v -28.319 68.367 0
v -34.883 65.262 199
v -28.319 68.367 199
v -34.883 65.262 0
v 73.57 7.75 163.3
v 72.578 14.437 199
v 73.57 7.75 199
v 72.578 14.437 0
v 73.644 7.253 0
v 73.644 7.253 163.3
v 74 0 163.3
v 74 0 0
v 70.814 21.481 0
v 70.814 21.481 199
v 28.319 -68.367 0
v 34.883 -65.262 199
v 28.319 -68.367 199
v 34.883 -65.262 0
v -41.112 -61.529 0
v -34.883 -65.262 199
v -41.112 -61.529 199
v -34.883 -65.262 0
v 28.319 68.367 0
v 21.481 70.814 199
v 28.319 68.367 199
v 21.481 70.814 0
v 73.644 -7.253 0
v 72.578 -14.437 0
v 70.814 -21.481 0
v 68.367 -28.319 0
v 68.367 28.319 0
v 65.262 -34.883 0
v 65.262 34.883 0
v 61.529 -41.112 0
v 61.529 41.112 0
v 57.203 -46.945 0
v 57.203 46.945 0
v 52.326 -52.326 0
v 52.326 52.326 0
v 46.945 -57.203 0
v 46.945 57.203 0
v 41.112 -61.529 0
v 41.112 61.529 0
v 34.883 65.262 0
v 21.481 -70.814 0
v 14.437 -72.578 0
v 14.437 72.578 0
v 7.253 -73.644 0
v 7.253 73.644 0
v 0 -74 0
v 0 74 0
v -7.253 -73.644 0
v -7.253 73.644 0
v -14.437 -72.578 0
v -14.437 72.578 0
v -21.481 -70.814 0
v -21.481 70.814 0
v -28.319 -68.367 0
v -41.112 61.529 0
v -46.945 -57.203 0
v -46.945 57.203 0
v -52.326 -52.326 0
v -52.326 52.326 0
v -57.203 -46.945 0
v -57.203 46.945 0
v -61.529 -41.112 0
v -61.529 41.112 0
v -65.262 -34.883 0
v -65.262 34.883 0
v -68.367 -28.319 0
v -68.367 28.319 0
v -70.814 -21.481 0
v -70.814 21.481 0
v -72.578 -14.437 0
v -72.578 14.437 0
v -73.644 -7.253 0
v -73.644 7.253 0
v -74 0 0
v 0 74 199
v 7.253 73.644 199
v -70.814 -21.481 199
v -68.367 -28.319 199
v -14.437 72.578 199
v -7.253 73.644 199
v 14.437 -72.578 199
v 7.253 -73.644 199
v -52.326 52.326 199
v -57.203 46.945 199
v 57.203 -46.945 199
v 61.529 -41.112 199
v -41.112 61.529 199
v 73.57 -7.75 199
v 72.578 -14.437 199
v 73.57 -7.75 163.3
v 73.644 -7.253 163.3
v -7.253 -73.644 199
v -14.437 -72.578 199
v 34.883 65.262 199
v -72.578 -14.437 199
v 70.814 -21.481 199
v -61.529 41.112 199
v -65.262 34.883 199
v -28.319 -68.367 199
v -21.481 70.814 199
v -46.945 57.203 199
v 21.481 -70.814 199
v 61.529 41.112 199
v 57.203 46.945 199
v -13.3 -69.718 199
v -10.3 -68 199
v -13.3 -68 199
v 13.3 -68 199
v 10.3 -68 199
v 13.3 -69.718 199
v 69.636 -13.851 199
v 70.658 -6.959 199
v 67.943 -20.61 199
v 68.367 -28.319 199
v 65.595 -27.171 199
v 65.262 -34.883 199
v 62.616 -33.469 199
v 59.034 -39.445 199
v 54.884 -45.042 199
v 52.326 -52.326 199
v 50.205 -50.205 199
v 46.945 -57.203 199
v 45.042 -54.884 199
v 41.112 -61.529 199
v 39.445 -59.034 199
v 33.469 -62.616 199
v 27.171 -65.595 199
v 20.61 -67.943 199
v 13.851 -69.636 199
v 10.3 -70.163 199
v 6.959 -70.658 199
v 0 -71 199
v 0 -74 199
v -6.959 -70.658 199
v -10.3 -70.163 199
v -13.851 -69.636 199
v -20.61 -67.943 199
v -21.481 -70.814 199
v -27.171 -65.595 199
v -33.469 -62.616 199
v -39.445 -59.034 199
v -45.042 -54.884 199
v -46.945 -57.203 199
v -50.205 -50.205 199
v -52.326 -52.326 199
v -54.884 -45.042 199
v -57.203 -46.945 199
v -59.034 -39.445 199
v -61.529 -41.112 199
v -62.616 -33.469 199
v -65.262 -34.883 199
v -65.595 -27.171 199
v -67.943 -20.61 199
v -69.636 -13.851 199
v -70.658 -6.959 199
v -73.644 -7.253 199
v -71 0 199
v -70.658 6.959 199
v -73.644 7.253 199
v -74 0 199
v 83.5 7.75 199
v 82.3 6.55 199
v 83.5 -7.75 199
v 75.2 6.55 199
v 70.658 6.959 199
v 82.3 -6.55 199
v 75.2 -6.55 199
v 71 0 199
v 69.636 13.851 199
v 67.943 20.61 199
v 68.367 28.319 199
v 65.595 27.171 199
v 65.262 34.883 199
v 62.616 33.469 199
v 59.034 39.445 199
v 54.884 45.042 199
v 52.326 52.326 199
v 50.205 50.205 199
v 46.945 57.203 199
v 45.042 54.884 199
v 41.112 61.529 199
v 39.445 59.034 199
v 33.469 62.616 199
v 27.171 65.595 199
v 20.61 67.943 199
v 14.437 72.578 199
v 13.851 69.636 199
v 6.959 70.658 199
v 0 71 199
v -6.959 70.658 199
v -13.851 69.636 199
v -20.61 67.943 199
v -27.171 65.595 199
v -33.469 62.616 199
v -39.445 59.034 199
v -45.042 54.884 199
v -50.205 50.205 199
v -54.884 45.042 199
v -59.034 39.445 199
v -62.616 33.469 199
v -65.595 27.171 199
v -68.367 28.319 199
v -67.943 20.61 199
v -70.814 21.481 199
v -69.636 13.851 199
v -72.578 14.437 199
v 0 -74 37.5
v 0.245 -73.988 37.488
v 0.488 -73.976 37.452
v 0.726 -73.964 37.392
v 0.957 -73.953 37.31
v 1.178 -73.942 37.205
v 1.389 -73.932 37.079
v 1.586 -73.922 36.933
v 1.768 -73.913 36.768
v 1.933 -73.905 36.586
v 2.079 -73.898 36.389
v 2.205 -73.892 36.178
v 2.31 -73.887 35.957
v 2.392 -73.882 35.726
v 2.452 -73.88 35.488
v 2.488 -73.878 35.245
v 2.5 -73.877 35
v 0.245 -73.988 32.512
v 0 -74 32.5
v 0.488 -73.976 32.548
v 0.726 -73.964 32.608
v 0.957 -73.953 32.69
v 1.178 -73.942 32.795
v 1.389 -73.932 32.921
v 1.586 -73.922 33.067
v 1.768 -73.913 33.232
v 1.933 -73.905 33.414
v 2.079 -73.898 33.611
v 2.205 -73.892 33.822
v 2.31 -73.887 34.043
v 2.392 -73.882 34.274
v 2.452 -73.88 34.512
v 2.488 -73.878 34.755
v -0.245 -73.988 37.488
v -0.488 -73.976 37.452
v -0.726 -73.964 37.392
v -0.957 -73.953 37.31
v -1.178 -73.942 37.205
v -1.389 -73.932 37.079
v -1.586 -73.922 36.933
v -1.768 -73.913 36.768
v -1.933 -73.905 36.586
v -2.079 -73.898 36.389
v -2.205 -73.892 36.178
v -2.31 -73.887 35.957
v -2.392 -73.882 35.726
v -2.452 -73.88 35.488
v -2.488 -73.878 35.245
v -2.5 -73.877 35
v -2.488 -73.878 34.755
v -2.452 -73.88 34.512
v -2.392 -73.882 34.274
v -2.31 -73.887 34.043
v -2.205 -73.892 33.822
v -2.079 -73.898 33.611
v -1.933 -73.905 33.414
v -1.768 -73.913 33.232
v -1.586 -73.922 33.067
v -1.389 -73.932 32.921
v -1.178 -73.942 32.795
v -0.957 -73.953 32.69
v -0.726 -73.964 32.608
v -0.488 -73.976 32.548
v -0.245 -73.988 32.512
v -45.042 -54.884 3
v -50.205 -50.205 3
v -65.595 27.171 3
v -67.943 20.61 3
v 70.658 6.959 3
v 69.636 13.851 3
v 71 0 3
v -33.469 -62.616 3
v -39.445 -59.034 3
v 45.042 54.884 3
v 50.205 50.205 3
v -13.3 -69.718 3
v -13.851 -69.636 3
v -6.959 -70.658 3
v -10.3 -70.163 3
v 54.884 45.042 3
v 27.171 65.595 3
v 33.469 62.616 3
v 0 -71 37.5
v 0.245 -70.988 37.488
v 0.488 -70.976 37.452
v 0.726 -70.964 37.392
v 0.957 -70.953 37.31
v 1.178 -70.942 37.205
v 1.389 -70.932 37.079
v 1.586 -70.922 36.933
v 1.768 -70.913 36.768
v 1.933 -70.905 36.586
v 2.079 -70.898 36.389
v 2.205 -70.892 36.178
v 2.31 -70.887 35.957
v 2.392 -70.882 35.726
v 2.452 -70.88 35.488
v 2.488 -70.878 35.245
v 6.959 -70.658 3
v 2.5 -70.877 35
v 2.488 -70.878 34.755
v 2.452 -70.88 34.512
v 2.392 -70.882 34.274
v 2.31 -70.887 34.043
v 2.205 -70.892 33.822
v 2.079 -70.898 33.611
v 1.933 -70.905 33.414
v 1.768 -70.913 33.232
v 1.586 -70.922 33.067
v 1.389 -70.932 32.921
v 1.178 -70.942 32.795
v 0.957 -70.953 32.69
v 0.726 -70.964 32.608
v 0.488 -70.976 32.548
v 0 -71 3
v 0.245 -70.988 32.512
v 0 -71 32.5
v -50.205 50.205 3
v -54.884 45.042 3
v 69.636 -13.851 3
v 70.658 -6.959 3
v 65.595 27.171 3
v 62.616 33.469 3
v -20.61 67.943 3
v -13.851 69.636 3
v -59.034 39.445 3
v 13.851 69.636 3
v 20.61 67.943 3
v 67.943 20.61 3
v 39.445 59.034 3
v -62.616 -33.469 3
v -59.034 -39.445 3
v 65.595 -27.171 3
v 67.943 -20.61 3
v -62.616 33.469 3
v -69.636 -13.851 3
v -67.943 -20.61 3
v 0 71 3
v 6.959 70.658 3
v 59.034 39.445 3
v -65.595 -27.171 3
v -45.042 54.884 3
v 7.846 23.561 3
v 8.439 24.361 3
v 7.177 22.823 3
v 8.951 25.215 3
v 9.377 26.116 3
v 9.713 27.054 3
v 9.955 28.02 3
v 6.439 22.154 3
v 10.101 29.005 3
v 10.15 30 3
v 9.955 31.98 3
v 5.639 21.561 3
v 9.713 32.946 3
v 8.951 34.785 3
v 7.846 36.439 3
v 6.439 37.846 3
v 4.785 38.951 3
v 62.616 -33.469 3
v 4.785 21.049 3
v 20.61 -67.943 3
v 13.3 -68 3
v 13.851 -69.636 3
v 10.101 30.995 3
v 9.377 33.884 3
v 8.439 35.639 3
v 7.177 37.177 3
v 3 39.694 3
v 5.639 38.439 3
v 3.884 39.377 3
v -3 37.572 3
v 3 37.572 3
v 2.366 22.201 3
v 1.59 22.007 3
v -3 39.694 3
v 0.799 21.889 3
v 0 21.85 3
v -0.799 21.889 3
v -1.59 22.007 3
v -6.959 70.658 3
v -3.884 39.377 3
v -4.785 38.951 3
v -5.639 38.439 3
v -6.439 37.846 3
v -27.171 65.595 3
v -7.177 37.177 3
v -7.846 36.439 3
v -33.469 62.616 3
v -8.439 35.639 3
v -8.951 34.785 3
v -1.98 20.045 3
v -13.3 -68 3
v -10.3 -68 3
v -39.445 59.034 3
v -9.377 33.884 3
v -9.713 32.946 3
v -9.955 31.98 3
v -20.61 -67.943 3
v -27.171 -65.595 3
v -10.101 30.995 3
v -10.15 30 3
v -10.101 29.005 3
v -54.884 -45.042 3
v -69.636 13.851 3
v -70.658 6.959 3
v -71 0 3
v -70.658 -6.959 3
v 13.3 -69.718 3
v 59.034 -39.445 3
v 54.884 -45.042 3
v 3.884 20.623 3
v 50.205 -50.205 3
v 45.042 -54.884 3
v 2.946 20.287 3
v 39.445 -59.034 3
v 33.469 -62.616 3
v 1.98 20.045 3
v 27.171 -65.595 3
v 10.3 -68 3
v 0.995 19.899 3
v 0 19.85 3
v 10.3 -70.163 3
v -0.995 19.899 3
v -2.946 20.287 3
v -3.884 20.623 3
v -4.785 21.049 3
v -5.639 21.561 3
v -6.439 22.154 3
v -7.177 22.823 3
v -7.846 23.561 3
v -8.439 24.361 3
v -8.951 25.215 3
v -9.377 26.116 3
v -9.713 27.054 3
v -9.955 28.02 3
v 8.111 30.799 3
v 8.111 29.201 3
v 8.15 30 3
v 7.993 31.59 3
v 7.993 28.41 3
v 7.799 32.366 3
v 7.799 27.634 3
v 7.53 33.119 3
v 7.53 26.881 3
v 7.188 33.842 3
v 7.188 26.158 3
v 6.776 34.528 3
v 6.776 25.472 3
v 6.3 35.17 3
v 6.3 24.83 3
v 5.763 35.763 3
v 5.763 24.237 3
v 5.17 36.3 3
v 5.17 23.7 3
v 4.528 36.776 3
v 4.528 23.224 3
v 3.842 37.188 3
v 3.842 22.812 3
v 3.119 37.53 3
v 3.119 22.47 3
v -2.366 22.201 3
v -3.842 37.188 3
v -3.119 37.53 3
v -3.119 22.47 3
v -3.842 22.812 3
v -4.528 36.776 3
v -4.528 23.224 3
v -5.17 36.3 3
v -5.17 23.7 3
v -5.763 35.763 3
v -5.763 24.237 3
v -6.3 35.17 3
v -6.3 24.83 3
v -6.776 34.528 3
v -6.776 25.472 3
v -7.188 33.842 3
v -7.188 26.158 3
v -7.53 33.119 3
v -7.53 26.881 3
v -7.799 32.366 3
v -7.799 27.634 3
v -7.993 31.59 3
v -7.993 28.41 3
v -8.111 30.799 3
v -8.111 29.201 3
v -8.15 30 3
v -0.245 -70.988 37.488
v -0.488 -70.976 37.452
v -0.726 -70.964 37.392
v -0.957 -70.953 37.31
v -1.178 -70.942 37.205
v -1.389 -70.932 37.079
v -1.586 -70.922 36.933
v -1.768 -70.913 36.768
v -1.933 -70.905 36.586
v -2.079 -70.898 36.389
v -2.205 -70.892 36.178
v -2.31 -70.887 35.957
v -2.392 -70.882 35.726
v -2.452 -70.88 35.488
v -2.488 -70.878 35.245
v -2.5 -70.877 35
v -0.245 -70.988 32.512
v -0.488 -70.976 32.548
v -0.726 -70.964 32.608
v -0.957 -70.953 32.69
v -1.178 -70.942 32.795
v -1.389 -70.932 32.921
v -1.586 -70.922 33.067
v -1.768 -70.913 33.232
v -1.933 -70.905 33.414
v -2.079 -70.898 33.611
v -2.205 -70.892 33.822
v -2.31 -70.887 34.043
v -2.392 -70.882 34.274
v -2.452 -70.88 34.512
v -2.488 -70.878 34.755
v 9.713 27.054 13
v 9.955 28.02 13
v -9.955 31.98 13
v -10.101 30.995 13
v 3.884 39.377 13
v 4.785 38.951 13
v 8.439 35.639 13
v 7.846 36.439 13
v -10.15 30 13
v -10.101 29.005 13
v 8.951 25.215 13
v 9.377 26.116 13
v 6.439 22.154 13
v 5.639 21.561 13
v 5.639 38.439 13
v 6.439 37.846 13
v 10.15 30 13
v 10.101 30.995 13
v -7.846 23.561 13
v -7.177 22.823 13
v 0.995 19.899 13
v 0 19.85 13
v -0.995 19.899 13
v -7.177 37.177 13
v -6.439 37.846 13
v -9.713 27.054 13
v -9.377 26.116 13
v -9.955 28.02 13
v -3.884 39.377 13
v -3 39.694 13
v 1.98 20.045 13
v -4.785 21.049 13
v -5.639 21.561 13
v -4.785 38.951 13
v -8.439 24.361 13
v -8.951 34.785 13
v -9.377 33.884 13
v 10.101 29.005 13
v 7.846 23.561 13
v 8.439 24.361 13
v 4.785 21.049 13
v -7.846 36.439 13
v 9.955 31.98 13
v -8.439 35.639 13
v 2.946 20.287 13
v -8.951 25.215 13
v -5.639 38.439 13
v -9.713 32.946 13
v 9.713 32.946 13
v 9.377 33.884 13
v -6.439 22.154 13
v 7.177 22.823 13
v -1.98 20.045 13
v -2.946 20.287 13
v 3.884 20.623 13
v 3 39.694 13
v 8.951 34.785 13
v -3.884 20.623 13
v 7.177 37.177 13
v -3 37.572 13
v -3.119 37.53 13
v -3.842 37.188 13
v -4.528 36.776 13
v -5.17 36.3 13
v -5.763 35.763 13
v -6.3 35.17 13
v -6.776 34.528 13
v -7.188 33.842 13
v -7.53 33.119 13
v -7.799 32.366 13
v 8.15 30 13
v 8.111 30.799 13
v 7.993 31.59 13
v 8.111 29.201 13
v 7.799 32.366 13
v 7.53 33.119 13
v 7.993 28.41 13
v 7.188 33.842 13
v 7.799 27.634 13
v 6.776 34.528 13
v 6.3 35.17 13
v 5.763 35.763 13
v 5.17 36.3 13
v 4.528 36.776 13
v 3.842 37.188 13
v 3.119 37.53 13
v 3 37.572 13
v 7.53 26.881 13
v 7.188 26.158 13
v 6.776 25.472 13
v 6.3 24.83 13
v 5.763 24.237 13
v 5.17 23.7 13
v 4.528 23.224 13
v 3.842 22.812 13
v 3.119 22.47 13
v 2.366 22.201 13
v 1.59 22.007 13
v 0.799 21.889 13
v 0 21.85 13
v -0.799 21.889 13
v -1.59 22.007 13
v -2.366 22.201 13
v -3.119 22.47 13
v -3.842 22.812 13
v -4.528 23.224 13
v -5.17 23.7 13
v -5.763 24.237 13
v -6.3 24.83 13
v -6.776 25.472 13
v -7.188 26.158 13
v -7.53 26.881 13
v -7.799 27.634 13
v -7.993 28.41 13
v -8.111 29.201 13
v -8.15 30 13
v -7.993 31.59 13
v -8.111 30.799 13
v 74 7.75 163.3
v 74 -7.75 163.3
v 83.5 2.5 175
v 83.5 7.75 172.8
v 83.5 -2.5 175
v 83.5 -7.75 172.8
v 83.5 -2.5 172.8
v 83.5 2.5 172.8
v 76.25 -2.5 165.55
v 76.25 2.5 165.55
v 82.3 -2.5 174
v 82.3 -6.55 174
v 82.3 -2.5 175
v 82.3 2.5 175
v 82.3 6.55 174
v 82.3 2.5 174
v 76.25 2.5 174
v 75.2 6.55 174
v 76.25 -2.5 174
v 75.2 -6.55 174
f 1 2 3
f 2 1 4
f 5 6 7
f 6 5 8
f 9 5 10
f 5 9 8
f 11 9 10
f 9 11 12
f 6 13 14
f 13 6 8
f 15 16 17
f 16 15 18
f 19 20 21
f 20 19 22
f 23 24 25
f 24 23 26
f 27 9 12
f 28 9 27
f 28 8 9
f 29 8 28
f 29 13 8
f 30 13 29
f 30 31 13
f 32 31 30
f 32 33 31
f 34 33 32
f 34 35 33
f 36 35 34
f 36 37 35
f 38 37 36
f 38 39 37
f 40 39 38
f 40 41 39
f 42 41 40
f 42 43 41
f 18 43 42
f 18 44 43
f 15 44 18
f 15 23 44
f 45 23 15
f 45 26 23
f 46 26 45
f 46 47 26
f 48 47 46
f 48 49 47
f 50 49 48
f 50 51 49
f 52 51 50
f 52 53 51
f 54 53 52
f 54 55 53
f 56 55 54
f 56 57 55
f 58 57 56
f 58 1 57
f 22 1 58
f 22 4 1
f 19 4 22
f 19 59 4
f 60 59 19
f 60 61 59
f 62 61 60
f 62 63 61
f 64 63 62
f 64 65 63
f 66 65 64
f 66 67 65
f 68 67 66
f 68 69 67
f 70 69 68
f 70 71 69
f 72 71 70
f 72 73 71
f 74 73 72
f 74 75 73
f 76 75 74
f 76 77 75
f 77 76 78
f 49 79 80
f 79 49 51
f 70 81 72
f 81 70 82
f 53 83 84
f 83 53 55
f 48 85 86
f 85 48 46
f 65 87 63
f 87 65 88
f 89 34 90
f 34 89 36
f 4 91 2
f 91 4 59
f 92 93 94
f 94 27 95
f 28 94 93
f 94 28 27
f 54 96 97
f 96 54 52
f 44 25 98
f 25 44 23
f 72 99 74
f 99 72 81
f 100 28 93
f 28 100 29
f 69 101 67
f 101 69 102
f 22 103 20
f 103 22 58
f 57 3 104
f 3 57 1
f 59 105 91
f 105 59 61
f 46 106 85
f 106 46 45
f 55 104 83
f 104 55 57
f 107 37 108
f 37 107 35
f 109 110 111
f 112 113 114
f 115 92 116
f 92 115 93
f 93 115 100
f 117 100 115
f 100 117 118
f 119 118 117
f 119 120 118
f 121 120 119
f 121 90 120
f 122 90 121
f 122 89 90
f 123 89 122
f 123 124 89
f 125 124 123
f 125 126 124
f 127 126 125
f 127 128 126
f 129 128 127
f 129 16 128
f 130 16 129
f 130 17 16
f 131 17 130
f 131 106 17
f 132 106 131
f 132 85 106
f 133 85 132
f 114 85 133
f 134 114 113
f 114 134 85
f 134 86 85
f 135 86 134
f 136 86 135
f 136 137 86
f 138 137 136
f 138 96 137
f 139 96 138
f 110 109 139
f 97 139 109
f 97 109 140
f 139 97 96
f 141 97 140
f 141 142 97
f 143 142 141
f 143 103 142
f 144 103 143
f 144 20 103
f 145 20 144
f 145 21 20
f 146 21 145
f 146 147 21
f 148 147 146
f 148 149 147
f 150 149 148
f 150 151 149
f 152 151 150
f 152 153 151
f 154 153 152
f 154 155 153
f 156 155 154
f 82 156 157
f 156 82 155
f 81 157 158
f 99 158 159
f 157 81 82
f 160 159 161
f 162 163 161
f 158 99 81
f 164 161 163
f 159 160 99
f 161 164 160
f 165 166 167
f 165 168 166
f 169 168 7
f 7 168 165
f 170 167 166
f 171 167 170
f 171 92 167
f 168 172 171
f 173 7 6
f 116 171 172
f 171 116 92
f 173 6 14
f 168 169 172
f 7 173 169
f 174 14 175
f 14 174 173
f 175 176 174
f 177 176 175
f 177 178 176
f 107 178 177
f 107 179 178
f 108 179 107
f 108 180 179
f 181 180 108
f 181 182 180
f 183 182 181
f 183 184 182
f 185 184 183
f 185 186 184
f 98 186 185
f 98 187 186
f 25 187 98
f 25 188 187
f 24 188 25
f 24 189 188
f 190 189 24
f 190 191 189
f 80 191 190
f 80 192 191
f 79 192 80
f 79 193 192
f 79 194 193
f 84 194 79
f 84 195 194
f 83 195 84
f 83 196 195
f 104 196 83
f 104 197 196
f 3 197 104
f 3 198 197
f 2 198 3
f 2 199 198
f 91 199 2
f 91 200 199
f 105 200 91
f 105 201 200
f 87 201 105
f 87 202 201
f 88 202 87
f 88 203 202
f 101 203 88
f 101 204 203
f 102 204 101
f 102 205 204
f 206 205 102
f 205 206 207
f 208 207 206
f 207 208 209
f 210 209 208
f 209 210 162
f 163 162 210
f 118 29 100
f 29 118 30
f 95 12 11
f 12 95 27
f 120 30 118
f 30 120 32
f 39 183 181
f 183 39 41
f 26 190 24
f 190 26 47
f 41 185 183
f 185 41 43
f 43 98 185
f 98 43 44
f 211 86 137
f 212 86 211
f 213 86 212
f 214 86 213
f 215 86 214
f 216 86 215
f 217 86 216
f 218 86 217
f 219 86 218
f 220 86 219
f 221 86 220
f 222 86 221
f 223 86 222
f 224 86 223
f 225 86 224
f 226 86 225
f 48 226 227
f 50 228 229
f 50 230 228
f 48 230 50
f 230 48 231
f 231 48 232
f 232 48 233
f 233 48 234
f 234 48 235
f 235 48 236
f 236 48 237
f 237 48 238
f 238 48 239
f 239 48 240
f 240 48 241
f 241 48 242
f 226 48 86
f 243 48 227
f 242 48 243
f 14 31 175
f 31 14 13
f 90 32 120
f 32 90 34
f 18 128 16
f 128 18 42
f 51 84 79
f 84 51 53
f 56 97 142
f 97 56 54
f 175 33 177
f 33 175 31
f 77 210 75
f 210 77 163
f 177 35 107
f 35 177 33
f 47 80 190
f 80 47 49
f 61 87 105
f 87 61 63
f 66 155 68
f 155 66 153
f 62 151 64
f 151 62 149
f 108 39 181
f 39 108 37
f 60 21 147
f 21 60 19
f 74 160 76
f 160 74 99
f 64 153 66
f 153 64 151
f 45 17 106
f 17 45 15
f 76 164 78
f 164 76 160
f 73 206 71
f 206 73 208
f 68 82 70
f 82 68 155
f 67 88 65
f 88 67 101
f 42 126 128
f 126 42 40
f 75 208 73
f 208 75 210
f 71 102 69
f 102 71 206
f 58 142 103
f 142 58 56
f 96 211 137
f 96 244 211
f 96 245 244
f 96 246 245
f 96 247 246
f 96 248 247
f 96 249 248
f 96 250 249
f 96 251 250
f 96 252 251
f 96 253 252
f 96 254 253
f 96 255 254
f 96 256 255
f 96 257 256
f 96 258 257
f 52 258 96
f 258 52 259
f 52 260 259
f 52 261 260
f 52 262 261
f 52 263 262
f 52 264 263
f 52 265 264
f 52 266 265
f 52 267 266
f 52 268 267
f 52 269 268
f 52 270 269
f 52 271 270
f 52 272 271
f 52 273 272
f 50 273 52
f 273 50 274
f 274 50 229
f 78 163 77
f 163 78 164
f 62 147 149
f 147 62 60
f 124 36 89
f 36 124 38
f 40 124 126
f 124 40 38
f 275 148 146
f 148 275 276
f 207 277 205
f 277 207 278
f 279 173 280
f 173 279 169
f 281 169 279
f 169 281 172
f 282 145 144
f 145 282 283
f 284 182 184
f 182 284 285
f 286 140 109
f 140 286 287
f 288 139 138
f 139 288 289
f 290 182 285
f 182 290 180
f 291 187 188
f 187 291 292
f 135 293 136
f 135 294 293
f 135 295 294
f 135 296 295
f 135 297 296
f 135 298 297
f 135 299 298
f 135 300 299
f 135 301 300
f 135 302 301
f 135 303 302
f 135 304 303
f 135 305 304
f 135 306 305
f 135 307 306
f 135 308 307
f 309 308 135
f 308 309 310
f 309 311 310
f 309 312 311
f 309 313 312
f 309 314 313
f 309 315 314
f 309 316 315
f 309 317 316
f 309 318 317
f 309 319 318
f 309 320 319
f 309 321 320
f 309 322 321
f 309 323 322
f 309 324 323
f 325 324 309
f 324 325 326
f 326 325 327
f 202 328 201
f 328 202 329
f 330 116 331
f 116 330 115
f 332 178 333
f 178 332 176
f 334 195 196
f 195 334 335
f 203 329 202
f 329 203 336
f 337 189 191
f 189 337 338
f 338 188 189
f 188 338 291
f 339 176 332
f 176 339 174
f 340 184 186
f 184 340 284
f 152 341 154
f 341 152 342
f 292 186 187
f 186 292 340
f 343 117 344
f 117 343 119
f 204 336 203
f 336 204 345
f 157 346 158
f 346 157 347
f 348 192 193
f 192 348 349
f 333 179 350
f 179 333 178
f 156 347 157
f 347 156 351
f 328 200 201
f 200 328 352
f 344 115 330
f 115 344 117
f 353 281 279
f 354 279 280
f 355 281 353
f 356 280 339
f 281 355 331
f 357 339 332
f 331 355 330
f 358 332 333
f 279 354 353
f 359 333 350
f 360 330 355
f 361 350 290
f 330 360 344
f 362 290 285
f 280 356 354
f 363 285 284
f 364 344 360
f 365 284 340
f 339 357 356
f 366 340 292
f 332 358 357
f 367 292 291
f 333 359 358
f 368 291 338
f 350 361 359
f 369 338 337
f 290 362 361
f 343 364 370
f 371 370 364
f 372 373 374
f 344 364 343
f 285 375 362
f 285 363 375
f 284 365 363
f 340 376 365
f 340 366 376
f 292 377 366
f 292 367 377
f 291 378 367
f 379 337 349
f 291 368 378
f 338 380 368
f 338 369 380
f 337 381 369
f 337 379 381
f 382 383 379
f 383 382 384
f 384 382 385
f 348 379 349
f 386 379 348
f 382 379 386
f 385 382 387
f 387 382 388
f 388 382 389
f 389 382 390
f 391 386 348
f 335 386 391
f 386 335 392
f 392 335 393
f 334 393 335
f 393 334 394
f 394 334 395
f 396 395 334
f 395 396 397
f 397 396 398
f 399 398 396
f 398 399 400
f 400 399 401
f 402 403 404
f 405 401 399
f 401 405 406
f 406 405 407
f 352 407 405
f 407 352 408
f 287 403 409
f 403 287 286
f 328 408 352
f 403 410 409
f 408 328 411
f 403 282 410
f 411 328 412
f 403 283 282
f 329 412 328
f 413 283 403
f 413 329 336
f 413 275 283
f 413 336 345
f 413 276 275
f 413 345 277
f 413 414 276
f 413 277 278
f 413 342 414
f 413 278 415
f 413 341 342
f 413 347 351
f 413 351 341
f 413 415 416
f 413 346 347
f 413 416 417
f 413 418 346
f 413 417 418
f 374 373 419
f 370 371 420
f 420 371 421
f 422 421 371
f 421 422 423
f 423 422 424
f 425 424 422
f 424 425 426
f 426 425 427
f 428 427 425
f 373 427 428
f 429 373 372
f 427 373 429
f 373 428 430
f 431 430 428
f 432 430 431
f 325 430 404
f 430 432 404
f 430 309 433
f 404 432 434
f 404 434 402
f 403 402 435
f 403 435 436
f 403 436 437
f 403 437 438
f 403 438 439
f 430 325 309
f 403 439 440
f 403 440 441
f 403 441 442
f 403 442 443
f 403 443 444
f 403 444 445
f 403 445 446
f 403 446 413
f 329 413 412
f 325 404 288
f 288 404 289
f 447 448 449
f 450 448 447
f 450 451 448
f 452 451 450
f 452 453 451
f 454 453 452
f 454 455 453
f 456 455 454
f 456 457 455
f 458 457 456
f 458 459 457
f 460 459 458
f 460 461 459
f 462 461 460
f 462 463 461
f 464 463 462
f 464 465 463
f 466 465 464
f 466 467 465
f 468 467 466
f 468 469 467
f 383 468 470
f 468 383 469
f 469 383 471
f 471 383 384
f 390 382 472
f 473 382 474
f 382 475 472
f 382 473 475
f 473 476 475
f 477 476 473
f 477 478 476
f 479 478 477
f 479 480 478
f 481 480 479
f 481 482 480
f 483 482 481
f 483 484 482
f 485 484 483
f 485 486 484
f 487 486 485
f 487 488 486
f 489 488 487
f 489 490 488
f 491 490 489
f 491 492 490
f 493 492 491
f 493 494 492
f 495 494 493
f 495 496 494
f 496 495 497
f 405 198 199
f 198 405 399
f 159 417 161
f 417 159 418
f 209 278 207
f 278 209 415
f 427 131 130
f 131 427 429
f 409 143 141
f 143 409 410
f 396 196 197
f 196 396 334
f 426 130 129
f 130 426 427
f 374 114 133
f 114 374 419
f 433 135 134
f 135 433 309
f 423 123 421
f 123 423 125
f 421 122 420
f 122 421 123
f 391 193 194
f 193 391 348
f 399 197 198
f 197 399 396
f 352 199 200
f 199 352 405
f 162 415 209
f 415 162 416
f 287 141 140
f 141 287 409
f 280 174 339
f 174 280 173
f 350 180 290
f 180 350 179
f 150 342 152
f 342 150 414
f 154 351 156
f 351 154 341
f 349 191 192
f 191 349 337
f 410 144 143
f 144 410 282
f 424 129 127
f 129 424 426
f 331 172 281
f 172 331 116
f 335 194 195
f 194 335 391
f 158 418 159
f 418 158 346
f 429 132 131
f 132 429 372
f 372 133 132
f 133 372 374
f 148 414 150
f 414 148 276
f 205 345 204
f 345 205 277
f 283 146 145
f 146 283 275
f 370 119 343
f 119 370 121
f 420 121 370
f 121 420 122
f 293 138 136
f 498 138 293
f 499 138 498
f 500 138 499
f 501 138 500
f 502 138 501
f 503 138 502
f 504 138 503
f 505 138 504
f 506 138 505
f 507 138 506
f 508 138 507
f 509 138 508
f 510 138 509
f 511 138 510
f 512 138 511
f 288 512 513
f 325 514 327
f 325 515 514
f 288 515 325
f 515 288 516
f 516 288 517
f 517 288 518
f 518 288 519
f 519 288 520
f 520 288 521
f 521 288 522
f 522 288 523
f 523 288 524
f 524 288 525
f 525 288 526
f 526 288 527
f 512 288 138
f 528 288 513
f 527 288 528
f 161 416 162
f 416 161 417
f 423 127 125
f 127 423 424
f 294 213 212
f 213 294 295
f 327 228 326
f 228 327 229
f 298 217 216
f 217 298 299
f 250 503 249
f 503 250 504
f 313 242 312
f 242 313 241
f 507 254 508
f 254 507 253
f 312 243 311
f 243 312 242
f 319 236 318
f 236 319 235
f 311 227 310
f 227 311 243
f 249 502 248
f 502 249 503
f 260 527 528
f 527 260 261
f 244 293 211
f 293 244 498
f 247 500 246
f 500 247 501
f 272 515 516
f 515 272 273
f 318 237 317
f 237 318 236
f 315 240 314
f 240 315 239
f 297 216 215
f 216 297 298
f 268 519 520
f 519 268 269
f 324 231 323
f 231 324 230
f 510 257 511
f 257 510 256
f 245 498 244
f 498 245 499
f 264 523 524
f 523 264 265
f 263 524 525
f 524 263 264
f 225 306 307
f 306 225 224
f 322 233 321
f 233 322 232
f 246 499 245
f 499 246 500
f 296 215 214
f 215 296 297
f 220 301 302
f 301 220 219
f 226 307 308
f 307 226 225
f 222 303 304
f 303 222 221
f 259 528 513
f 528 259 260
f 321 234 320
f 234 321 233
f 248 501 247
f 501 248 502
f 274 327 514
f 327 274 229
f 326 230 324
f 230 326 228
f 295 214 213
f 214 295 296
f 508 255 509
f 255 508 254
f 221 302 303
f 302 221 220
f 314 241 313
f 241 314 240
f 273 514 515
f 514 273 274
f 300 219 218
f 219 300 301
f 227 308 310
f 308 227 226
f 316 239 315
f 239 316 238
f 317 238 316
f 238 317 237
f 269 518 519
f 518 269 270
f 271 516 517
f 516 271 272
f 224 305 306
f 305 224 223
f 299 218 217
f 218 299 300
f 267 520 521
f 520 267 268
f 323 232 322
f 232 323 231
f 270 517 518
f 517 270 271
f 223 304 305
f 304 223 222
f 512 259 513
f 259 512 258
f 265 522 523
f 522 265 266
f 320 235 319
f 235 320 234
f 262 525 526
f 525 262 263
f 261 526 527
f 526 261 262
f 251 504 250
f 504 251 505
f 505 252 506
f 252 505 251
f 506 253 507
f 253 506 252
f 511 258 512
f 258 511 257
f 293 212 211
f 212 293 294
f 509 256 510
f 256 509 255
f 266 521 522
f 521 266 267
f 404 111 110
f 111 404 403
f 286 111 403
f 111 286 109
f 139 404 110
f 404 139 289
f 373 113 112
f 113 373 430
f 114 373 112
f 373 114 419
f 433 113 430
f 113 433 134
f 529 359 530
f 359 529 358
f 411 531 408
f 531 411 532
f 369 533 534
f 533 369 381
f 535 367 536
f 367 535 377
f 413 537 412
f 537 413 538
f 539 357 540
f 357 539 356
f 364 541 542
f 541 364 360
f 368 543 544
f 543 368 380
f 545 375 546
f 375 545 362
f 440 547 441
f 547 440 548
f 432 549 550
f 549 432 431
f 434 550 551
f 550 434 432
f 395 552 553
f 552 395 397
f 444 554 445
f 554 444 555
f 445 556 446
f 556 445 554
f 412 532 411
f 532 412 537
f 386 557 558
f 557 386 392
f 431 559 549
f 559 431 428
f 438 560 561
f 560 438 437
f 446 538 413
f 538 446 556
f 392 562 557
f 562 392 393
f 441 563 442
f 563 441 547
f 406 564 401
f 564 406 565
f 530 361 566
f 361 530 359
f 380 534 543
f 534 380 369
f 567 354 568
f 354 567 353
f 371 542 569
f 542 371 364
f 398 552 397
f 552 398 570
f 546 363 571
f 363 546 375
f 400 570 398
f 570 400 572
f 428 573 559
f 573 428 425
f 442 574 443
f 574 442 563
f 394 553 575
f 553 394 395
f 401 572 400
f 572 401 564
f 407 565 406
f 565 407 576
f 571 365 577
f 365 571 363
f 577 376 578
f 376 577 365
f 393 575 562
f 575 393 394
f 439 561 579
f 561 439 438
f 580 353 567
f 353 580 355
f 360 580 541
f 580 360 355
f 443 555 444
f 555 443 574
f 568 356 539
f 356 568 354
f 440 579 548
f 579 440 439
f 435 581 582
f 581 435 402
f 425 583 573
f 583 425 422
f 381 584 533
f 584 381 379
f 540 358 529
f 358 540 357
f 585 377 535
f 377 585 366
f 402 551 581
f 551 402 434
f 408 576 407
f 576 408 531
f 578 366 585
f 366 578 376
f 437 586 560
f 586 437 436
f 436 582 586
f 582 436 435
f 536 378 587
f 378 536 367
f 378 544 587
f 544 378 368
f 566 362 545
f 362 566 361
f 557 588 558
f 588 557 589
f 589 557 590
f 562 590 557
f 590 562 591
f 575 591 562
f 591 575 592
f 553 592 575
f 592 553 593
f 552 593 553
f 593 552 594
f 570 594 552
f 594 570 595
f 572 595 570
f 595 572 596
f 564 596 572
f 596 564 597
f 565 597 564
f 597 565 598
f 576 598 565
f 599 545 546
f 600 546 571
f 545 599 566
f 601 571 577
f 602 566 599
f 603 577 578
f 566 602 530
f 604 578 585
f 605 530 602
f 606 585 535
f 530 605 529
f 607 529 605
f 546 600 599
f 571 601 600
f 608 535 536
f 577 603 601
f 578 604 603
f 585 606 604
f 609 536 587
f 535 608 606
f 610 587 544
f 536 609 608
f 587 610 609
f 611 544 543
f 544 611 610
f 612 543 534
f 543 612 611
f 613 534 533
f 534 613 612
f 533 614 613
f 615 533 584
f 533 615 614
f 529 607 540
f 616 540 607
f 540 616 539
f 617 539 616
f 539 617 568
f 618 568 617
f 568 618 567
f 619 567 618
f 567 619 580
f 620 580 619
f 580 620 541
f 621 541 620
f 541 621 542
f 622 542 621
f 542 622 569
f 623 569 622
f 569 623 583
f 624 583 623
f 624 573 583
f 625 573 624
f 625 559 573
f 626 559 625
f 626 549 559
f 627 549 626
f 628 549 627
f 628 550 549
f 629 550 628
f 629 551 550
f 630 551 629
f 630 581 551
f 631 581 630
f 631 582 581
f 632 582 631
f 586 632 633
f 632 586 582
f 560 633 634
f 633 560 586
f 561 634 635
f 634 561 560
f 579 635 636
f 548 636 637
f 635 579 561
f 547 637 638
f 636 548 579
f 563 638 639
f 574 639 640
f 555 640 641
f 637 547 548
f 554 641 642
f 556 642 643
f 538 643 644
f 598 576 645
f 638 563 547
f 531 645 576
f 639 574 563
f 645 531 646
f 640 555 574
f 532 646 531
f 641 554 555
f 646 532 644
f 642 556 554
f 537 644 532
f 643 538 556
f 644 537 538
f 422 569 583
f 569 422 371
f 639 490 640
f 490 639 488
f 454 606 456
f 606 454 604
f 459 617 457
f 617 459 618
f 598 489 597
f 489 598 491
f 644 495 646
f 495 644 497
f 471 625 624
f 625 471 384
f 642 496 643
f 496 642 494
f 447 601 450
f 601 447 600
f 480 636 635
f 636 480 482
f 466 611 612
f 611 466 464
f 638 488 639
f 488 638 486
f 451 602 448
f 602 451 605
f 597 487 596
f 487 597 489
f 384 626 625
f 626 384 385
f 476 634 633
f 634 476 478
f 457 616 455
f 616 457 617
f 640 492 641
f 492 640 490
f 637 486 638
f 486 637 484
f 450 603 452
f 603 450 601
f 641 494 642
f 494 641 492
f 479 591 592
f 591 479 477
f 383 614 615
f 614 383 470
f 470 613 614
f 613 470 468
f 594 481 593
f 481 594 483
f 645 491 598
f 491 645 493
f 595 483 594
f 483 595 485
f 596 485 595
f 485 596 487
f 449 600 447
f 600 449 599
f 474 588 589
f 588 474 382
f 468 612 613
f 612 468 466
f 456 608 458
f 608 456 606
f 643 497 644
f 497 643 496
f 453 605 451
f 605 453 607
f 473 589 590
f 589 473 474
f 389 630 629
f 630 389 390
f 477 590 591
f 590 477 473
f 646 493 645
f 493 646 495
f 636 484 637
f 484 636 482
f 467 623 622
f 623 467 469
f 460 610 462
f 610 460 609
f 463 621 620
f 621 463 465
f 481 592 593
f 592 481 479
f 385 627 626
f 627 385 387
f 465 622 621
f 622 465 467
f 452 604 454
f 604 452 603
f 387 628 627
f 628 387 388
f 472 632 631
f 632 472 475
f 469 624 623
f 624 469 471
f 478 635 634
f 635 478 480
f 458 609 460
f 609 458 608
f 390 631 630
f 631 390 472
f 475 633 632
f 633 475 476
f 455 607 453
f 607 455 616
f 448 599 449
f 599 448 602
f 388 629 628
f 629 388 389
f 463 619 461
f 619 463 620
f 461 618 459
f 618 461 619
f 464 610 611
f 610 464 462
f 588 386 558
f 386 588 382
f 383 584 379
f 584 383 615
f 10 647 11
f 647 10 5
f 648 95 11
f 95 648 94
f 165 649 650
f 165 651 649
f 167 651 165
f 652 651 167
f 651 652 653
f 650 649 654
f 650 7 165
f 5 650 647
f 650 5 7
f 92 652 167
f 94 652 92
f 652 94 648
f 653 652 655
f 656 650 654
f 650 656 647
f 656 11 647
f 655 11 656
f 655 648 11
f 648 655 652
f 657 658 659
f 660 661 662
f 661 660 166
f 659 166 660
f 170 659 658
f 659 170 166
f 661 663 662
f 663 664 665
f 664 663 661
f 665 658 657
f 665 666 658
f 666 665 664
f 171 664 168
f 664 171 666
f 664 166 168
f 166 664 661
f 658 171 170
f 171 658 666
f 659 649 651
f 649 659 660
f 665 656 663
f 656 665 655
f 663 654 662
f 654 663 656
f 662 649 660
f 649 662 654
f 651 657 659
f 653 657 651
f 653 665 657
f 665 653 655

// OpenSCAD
// =============================================================================
// Reservoir — Vand-beholder som plant cup hænger nedsænket i (Variant A)
// =============================================================================
// ZERO-PENETRATION (ADR 009): reservoiret har INGEN gennemføringer under
// vandlinjen — bunden og væggen under overflow-niveau er 100% tætte.
// Eneste hul er OVERFLOW-hullet (over max-fill, det er selve pointen).
// Slanger og kabler ruter gennem ring-gabet og cup-flangens åbninger.
//
// Features (vinkler jf. params.scad allokering / ADR 010 scalloped cup):
//   90°: float switch klips-ring i bunden (kabel op ad cup'ens kabel-kanal)
//    0°: lomme UDEN PÅ væggen til USB-C-forlængerens hun-ende (ADR 013) —
//        stikket flugter med rimmen, flangen har et hak ovenover
//  270°: to lodrette guide-ribber til water level strip — de stikker ind i
//        cup'ens brede REFILL-KANAL og fungerer samtidig som rotations-lås
//        (ribbe-spændet passer kun i den kanal) — plus overflow-hul i
//        væggen, 8mm under cup-bund-niveau
//
// STACK VARIANT A: høj cylinder hvor cuppen hænger fra top-rimmen via sin
// flange. Vandet lever i zonen UNDER cup-bunden. Højde og kapacitet
// beregnes i params.scad (M-cup: ~199mm, ~815 ml til overflow-niveau).
//
// PRINT: PETG. 3 perimeters minimum. 100% bund. Print upright med brim.
// Høj print (~200mm) — Prusa XL klarer det fint; brug draft shield ved træk.
// =============================================================================

include <params.scad>

module reservoir() {
    union() {
        difference() {
            // ─── Solid outer body ───────────────────────────────────────────
            cylinder(d = reservoir_outer_d, h = reservoir_height);

            // Hovedhulrum (vand + plads til nedsænket cup)
            translate([0, 0, reservoir_wall])
                cylinder(d = reservoir_inner_d,
                         h = reservoir_height + 1);

            // Overflow-hul ved 270° — eneste hul, og det sidder BEVIDST
            // ved max-fill niveau (8mm under cup-bund). Overløb drypper
            // ud i pyntepotten, synligt fra refill-åbningen ovenover.
            rotate([0, 0, 270])
                translate([0, 0, overflow_z])
                    rotate([0, 90, 0])
                        cylinder(d = overflow_hole_d,
                                 h = reservoir_outer_d / 2 + 2);
        }

        // ─── Additive features (ingen af dem gennembryder væggen) ───────────

        // Water level strip guide-ribber ved 270° — inde i cup'ens
        // refill-kanal. Strippen skubbes ned mellem ribberne og hviler
        // mod indervæggen. Ribberne går i FULD højde op til rimmen:
        // de fungerer samtidig som rotations-lås (spændet ~26mm passerer
        // kun cup'ens Ø30 refill-kanal — de smallere kanaler blokerer).
        for (side = [-1, 1]) {
            rotate([0, 0, channel_refill_angle])
                translate([reservoir_inner_d / 2 - strip_rib_t,
                           side * (waterlevel_strip_w / 2 + print_tolerance
                                   + strip_rib_w / 2) - strip_rib_w / 2,
                           reservoir_wall])
                    cube([strip_rib_t, strip_rib_w,
                          reservoir_height - reservoir_wall]);
        }

        // Float switch klips-ring i bunden ved 90° (åben ring, floaten
        // presses ned i). Kablet føres langs bunden ud til ring-gabet.
        rotate([0, 0, 90])
            translate([float_switch_x, 0, reservoir_wall])
                difference() {
                    cylinder(d = float_switch_d + 2 * float_clip_wall
                                 + print_tolerance,
                             h = float_clip_h);
                    translate([0, 0, -0.5])
                        cylinder(d = float_switch_d + print_tolerance,
                                 h = float_clip_h + 1);
                    // Kabel-udgang i klips-ringen (mod ring-gabet, +X lokal)
                    translate([0, -3, -0.5])
                        cube([float_switch_d, 6, float_clip_h + 1]);
                }

        usbc_sleeve();

        // (Rim-tapper fjernet — ADR 010: orientering låses af strip-
        //  ribberne i refill-kanalen, centrering af 1mm kant-clearance.)
    }
}

// USB-C-lomme uden på væggen: åben top (stikket flugter med rimmen), hylde
// forneden med kabel-slids åben udad. 45° fas under → printes uden support.
module usbc_sleeve() {
    ro  = reservoir_outer_d / 2;
    cw  = usbc_body_t + 2 * print_tolerance;     // hulrum radialt
    cl  = usbc_body_w + 2 * print_tolerance;     // hulrum tangentielt
    d   = cw + 2 * usbc_sleeve_wall;             // lommens dybde ud fra væggen
    w   = cl + 2 * usbc_sleeve_wall;
    z0  = reservoir_height - usbc_body_l - usbc_sleeve_wall;
    rotate([0, 0, usbc_angle])
        difference() {
            hull() {
                translate([ro - 0.5, -w / 2, z0])
                    cube([d + 0.5, w, reservoir_height - z0]);
                translate([ro - 0.5, -w / 2, z0 - d])
                    cube([0.5, w, 0.01]);
            }
            // Hulrum til stikket
            translate([ro + usbc_sleeve_wall, -cl / 2, z0 + usbc_sleeve_wall])
                cube([cw, cl, usbc_body_l + 1]);
            // Kabel-slids i hylden, åben udad
            translate([ro + usbc_sleeve_wall + cw / 2 - 2.5, -2.5, z0 - d - 1])
                cube([d, 5, d + usbc_sleeve_wall + 2]);
        }
}

// Render reservoir når filen åbnes direkte
reservoir();
